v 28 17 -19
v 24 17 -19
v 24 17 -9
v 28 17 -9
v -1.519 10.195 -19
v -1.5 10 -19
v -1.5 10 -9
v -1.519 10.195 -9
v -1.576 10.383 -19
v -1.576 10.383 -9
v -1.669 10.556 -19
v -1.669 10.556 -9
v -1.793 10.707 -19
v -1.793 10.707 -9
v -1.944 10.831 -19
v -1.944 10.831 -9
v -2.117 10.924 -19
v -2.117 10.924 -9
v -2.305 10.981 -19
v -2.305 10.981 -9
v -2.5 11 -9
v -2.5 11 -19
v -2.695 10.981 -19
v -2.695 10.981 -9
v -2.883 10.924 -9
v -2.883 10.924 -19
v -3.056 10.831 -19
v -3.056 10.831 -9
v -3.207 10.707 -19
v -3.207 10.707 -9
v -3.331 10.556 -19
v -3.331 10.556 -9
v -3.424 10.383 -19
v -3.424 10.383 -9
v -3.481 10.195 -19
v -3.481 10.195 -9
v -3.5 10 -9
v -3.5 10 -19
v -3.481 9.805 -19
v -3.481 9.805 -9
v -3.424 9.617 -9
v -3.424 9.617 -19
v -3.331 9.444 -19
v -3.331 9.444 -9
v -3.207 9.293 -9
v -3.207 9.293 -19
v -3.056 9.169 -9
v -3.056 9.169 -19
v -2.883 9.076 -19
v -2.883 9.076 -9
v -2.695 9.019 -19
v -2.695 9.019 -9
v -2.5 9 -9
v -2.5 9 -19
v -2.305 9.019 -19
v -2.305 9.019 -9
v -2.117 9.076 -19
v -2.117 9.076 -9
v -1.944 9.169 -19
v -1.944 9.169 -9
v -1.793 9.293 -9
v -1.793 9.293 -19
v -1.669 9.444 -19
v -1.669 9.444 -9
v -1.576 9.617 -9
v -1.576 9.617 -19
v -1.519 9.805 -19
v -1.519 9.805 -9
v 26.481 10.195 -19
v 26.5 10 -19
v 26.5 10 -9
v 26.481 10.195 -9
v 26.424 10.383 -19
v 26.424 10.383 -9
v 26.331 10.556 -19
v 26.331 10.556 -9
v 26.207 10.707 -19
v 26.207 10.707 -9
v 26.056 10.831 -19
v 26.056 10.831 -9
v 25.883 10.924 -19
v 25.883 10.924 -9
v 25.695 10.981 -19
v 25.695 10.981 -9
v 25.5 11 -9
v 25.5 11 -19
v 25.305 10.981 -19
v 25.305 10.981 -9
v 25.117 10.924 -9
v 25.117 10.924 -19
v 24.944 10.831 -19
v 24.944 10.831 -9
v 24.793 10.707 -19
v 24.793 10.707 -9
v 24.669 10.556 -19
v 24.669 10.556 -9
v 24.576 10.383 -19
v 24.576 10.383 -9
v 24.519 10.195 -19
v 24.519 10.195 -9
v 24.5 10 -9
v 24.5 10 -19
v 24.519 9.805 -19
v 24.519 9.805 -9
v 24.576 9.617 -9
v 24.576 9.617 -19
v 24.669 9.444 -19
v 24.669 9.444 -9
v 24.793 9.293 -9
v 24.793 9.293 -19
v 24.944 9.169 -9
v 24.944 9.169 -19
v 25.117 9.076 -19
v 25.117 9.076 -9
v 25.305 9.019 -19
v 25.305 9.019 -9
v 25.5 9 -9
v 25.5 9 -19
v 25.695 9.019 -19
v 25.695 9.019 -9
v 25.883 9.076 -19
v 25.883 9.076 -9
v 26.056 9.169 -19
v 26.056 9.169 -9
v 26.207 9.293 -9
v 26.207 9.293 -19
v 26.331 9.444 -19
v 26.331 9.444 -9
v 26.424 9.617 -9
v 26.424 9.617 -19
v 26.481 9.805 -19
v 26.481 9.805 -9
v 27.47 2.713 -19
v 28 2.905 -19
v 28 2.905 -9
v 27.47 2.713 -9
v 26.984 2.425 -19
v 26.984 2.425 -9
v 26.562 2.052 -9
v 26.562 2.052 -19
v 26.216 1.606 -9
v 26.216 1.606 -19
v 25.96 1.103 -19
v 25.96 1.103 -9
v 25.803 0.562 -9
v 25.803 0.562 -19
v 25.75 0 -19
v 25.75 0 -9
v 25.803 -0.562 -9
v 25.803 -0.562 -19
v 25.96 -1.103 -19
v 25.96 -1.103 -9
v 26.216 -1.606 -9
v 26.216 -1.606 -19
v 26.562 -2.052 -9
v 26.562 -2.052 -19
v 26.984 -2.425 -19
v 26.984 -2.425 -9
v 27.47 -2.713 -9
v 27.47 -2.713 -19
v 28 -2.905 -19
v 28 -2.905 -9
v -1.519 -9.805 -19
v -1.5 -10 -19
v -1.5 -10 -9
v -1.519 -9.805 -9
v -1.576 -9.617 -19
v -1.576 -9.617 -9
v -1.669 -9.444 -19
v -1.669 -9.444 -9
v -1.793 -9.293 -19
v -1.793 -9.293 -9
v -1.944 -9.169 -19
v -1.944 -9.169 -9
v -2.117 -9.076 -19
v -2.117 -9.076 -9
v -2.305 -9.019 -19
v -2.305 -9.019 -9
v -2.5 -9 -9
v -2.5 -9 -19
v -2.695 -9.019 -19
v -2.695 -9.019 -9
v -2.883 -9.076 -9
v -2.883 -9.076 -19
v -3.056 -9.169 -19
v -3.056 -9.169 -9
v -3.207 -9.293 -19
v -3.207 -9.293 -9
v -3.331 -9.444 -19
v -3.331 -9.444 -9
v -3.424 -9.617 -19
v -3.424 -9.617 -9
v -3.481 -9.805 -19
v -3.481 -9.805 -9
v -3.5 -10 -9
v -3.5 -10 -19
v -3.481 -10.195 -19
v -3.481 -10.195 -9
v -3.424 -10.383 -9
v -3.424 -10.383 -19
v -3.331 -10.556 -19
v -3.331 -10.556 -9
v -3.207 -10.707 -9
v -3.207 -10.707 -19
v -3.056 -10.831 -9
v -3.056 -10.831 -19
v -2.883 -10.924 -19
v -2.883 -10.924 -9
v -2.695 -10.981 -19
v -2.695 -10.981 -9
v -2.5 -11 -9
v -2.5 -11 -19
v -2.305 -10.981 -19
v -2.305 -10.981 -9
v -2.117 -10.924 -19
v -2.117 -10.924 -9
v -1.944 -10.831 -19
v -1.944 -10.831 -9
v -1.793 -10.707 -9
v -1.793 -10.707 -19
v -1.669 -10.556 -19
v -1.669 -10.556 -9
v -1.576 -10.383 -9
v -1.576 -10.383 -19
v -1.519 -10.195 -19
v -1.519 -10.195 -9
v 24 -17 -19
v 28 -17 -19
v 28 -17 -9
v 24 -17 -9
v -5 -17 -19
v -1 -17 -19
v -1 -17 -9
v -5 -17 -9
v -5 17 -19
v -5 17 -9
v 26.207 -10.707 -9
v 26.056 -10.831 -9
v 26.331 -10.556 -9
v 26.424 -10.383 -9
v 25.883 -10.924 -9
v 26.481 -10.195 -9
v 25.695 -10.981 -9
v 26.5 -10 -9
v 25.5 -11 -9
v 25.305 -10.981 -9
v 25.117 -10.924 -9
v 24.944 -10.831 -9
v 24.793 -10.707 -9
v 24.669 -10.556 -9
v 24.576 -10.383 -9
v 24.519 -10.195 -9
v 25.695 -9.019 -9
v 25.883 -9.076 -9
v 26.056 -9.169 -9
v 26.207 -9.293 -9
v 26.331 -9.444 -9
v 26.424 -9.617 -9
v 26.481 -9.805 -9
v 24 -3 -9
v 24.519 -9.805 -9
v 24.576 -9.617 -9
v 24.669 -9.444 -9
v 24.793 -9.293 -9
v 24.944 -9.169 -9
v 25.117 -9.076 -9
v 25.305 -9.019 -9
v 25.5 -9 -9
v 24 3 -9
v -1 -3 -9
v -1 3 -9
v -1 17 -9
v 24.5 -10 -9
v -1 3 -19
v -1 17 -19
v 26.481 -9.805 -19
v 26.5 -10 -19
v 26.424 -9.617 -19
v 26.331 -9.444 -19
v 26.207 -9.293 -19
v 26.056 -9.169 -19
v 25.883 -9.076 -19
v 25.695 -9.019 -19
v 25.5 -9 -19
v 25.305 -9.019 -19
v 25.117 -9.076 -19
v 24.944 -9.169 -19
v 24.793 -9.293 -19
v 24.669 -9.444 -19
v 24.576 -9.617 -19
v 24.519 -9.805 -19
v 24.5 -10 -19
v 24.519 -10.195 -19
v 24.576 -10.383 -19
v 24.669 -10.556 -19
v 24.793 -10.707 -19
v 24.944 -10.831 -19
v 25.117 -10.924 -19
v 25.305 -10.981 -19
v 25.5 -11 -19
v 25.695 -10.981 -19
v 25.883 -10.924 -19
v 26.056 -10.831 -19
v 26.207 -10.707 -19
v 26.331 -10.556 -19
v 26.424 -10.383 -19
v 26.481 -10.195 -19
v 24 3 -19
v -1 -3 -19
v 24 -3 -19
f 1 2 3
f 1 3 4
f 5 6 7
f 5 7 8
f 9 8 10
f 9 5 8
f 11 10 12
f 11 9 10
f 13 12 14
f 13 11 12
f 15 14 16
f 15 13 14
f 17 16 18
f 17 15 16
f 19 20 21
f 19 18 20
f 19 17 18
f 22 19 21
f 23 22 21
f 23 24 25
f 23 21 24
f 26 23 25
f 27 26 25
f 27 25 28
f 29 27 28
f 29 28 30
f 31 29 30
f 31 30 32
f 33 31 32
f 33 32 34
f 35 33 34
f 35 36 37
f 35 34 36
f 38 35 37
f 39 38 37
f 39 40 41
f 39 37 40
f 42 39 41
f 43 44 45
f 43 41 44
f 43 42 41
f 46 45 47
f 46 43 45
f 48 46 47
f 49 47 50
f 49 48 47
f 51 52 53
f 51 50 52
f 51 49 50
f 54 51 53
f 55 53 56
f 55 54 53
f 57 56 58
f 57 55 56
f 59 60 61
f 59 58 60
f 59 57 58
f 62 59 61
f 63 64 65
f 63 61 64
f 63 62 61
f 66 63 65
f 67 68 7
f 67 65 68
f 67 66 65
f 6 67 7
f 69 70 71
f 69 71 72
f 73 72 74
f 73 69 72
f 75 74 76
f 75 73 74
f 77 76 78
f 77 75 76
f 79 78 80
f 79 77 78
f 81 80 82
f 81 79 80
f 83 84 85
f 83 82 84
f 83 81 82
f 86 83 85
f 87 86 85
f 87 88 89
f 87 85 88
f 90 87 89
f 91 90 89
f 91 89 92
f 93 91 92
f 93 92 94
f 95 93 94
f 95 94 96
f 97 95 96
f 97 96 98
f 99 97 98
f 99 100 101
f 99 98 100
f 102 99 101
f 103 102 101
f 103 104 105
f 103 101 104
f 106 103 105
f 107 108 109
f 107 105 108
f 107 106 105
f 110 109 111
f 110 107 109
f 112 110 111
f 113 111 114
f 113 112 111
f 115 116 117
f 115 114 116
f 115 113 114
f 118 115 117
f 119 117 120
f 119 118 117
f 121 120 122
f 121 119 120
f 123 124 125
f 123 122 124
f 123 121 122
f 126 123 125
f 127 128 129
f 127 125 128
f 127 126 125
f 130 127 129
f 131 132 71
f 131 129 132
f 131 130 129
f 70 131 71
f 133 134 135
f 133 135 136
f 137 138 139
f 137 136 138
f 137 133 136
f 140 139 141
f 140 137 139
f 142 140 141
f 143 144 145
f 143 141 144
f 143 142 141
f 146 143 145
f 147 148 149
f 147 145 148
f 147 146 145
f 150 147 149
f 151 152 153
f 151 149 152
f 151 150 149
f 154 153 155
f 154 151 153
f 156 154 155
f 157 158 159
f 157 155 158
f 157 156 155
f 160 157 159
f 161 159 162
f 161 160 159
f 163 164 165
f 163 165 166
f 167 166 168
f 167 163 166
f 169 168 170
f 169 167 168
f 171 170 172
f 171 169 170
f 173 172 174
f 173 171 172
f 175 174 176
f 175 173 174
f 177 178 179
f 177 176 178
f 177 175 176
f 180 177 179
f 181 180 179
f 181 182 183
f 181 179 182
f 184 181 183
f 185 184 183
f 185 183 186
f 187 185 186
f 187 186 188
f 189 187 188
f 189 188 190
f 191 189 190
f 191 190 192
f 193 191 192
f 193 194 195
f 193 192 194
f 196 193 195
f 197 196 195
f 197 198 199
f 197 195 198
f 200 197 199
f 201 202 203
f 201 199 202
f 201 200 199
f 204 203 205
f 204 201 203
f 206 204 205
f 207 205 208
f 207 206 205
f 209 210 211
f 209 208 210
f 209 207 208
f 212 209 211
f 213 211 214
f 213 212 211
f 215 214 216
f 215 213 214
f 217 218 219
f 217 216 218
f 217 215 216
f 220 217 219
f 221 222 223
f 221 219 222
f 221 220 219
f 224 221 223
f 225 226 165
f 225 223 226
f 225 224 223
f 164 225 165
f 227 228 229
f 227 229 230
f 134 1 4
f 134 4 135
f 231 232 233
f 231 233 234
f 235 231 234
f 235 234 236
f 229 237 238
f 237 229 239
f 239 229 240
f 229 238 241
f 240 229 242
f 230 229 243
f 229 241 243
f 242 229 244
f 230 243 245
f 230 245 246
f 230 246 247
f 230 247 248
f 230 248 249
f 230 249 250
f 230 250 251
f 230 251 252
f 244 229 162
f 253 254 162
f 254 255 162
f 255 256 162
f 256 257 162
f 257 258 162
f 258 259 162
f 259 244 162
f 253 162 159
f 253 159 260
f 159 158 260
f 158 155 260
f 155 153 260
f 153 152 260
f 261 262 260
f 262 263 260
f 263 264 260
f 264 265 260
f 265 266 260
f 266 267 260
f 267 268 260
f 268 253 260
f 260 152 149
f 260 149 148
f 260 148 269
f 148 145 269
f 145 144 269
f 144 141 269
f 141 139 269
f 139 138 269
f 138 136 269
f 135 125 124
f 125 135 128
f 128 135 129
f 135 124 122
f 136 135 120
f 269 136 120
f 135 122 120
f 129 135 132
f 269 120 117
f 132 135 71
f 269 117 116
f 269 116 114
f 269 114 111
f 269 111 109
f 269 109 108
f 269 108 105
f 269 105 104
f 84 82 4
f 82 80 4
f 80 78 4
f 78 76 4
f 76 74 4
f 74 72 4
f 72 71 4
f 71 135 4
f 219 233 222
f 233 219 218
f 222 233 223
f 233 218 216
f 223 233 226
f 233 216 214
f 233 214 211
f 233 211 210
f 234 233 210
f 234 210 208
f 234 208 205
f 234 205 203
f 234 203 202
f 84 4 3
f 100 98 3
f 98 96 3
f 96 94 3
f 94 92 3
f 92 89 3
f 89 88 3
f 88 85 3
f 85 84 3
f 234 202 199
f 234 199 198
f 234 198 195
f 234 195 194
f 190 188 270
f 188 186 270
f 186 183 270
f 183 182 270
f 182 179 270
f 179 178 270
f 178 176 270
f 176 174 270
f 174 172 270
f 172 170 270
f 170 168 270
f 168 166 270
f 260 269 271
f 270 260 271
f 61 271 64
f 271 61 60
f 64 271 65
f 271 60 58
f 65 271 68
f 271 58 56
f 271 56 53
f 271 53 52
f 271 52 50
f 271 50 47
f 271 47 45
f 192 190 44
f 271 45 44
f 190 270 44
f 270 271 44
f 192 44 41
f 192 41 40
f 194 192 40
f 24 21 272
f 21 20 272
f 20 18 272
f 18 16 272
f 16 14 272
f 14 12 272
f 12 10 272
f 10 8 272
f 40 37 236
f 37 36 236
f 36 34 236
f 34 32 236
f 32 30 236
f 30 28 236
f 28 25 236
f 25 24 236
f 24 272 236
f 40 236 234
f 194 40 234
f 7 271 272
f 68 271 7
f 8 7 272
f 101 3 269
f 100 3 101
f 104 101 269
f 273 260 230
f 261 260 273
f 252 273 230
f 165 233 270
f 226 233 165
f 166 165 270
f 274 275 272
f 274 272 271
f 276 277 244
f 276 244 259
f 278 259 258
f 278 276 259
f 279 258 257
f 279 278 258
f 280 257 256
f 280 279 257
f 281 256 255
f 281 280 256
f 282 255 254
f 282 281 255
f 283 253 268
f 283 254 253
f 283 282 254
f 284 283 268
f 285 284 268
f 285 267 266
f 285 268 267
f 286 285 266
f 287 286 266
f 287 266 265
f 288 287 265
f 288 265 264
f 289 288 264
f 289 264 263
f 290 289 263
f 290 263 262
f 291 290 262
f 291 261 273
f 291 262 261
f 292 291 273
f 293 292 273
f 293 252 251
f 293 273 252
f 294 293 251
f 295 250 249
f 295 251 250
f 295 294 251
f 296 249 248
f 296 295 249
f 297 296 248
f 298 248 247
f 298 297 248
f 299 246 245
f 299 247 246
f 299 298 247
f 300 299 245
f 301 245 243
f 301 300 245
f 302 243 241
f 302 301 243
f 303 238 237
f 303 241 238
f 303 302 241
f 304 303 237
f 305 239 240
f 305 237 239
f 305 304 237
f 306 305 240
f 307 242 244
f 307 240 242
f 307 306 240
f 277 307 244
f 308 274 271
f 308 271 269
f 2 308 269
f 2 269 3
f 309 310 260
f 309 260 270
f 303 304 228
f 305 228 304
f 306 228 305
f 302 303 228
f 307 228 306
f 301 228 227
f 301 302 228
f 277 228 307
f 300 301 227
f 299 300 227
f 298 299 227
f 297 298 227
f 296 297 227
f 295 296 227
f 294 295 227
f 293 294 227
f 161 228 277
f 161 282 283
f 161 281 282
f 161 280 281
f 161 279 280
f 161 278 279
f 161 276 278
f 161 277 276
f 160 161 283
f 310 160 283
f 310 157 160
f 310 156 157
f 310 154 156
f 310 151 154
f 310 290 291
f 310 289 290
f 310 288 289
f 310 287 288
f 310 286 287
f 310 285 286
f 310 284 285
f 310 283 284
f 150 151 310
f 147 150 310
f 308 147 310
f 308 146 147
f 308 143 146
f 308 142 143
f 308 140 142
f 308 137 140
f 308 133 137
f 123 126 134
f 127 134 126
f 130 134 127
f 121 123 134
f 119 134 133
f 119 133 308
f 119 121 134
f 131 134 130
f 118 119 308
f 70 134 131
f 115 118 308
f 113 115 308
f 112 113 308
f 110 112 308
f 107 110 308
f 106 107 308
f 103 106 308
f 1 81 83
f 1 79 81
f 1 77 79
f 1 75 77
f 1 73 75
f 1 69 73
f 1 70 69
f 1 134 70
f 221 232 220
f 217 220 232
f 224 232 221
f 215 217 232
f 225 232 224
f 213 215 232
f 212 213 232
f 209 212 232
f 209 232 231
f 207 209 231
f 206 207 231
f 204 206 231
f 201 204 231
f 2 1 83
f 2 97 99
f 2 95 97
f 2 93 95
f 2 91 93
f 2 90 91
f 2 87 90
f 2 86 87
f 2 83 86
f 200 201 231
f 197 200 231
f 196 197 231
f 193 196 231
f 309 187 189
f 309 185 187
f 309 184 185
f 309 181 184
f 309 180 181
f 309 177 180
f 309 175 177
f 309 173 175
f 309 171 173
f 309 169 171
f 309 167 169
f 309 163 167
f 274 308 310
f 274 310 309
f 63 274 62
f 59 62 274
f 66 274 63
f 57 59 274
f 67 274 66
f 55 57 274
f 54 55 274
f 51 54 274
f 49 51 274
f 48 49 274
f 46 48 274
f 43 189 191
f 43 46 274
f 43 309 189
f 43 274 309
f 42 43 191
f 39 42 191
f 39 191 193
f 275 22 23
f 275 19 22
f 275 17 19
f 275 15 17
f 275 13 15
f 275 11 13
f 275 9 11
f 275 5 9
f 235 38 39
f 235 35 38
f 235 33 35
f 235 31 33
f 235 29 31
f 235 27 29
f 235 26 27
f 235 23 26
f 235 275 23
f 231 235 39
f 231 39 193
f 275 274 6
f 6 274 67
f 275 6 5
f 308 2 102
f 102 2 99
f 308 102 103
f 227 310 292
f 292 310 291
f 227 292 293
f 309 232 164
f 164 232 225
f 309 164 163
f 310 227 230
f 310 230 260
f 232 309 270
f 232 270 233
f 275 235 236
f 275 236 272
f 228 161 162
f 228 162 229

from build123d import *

# Parameters (mm, degrees)
CYLINDER156_R     = 3
CYLINDER156_DEPTH = 20
CYLINDER107_R     = 1
CYLINDER107_DEPTH = 15
CYLINDER108_R     = 1
CYLINDER108_DEPTH = 15
CYLINDER106_R     = 1
CYLINDER106_DEPTH = 15
CYLINDER105_R     = 1
CYLINDER105_DEPTH = 15
PAD005_DEPTH      = 10


with BuildPart() as zylinder156:
    # Cylinder156 → Cylinder156 (new body)
    with BuildSketch(Plane(origin=(28.75, 0, -21), x_dir=(1, 0, 0), z_dir=(0, 0, 1))):
        Circle(CYLINDER156_R)
    extrude(amount=CYLINDER156_DEPTH)


with BuildPart() as zylinder107:
    # Cylinder107 → Cylinder107 (new body)
    with BuildSketch(Plane(origin=(25.5, -10, -20), x_dir=(1, 0, 0), z_dir=(0, 0, 1))):
        Circle(CYLINDER107_R)
    extrude(amount=CYLINDER107_DEPTH)


with BuildPart() as zylinder108:
    # Cylinder108 → Cylinder108 (new body)
    with BuildSketch(Plane(origin=(25.5, 10, -20), x_dir=(1, 0, 0), z_dir=(0, 0, 1))):
        Circle(CYLINDER108_R)
    extrude(amount=CYLINDER108_DEPTH)


with BuildPart() as zylinder106:
    # Cylinder106 → Cylinder106 (new body)
    with BuildSketch(Plane(origin=(-2.5, -10, -20), x_dir=(1, 0, 0), z_dir=(0, 0, 1))):
        Circle(CYLINDER106_R)
    extrude(amount=CYLINDER106_DEPTH)


with BuildPart() as fusion074:
    # Cylinder105 → Cylinder105 (new body)
    with BuildSketch(Plane(origin=(-2.5, 10, -20), x_dir=(1, 0, 0), z_dir=(0, 0, 1))):
        Circle(CYLINDER105_R)
    extrude(amount=CYLINDER105_DEPTH)

    # Fusion074: union Zylinder107, Zylinder108, Zylinder106
    add(zylinder107.part)
    add(zylinder108.part)
    add(zylinder106.part)


with BuildPart() as fusion074_1:
    # Fusion074 placement: moved
    add(fusion074.part.moved(Location((0, 0, 17))))


with BuildPart() as cut076:
    # Sketch004 → Pad005 (new body)
    with BuildSketch(Plane.XY):
        Polygon((-5, 17), (-1, 17), (-1, 3), (24, 3), (24, 17), (28, 17), (28, -17), (24, -17), (24, -3), (-1, -3), (-1, -17), (-5, -17), align=None)
    extrude(amount=PAD005_DEPTH)

    # Cut055: cut Fusion074
    add(fusion074_1.part, mode=Mode.SUBTRACT)


with BuildPart() as cut076_1:
    # Cut055 placement: moved
    add(cut076.part.moved(Location((0, 0, -19))))

    # Cut076: cut Zylinder156
    add(zylinder156.part, mode=Mode.SUBTRACT)


solid = cut076_1.part
